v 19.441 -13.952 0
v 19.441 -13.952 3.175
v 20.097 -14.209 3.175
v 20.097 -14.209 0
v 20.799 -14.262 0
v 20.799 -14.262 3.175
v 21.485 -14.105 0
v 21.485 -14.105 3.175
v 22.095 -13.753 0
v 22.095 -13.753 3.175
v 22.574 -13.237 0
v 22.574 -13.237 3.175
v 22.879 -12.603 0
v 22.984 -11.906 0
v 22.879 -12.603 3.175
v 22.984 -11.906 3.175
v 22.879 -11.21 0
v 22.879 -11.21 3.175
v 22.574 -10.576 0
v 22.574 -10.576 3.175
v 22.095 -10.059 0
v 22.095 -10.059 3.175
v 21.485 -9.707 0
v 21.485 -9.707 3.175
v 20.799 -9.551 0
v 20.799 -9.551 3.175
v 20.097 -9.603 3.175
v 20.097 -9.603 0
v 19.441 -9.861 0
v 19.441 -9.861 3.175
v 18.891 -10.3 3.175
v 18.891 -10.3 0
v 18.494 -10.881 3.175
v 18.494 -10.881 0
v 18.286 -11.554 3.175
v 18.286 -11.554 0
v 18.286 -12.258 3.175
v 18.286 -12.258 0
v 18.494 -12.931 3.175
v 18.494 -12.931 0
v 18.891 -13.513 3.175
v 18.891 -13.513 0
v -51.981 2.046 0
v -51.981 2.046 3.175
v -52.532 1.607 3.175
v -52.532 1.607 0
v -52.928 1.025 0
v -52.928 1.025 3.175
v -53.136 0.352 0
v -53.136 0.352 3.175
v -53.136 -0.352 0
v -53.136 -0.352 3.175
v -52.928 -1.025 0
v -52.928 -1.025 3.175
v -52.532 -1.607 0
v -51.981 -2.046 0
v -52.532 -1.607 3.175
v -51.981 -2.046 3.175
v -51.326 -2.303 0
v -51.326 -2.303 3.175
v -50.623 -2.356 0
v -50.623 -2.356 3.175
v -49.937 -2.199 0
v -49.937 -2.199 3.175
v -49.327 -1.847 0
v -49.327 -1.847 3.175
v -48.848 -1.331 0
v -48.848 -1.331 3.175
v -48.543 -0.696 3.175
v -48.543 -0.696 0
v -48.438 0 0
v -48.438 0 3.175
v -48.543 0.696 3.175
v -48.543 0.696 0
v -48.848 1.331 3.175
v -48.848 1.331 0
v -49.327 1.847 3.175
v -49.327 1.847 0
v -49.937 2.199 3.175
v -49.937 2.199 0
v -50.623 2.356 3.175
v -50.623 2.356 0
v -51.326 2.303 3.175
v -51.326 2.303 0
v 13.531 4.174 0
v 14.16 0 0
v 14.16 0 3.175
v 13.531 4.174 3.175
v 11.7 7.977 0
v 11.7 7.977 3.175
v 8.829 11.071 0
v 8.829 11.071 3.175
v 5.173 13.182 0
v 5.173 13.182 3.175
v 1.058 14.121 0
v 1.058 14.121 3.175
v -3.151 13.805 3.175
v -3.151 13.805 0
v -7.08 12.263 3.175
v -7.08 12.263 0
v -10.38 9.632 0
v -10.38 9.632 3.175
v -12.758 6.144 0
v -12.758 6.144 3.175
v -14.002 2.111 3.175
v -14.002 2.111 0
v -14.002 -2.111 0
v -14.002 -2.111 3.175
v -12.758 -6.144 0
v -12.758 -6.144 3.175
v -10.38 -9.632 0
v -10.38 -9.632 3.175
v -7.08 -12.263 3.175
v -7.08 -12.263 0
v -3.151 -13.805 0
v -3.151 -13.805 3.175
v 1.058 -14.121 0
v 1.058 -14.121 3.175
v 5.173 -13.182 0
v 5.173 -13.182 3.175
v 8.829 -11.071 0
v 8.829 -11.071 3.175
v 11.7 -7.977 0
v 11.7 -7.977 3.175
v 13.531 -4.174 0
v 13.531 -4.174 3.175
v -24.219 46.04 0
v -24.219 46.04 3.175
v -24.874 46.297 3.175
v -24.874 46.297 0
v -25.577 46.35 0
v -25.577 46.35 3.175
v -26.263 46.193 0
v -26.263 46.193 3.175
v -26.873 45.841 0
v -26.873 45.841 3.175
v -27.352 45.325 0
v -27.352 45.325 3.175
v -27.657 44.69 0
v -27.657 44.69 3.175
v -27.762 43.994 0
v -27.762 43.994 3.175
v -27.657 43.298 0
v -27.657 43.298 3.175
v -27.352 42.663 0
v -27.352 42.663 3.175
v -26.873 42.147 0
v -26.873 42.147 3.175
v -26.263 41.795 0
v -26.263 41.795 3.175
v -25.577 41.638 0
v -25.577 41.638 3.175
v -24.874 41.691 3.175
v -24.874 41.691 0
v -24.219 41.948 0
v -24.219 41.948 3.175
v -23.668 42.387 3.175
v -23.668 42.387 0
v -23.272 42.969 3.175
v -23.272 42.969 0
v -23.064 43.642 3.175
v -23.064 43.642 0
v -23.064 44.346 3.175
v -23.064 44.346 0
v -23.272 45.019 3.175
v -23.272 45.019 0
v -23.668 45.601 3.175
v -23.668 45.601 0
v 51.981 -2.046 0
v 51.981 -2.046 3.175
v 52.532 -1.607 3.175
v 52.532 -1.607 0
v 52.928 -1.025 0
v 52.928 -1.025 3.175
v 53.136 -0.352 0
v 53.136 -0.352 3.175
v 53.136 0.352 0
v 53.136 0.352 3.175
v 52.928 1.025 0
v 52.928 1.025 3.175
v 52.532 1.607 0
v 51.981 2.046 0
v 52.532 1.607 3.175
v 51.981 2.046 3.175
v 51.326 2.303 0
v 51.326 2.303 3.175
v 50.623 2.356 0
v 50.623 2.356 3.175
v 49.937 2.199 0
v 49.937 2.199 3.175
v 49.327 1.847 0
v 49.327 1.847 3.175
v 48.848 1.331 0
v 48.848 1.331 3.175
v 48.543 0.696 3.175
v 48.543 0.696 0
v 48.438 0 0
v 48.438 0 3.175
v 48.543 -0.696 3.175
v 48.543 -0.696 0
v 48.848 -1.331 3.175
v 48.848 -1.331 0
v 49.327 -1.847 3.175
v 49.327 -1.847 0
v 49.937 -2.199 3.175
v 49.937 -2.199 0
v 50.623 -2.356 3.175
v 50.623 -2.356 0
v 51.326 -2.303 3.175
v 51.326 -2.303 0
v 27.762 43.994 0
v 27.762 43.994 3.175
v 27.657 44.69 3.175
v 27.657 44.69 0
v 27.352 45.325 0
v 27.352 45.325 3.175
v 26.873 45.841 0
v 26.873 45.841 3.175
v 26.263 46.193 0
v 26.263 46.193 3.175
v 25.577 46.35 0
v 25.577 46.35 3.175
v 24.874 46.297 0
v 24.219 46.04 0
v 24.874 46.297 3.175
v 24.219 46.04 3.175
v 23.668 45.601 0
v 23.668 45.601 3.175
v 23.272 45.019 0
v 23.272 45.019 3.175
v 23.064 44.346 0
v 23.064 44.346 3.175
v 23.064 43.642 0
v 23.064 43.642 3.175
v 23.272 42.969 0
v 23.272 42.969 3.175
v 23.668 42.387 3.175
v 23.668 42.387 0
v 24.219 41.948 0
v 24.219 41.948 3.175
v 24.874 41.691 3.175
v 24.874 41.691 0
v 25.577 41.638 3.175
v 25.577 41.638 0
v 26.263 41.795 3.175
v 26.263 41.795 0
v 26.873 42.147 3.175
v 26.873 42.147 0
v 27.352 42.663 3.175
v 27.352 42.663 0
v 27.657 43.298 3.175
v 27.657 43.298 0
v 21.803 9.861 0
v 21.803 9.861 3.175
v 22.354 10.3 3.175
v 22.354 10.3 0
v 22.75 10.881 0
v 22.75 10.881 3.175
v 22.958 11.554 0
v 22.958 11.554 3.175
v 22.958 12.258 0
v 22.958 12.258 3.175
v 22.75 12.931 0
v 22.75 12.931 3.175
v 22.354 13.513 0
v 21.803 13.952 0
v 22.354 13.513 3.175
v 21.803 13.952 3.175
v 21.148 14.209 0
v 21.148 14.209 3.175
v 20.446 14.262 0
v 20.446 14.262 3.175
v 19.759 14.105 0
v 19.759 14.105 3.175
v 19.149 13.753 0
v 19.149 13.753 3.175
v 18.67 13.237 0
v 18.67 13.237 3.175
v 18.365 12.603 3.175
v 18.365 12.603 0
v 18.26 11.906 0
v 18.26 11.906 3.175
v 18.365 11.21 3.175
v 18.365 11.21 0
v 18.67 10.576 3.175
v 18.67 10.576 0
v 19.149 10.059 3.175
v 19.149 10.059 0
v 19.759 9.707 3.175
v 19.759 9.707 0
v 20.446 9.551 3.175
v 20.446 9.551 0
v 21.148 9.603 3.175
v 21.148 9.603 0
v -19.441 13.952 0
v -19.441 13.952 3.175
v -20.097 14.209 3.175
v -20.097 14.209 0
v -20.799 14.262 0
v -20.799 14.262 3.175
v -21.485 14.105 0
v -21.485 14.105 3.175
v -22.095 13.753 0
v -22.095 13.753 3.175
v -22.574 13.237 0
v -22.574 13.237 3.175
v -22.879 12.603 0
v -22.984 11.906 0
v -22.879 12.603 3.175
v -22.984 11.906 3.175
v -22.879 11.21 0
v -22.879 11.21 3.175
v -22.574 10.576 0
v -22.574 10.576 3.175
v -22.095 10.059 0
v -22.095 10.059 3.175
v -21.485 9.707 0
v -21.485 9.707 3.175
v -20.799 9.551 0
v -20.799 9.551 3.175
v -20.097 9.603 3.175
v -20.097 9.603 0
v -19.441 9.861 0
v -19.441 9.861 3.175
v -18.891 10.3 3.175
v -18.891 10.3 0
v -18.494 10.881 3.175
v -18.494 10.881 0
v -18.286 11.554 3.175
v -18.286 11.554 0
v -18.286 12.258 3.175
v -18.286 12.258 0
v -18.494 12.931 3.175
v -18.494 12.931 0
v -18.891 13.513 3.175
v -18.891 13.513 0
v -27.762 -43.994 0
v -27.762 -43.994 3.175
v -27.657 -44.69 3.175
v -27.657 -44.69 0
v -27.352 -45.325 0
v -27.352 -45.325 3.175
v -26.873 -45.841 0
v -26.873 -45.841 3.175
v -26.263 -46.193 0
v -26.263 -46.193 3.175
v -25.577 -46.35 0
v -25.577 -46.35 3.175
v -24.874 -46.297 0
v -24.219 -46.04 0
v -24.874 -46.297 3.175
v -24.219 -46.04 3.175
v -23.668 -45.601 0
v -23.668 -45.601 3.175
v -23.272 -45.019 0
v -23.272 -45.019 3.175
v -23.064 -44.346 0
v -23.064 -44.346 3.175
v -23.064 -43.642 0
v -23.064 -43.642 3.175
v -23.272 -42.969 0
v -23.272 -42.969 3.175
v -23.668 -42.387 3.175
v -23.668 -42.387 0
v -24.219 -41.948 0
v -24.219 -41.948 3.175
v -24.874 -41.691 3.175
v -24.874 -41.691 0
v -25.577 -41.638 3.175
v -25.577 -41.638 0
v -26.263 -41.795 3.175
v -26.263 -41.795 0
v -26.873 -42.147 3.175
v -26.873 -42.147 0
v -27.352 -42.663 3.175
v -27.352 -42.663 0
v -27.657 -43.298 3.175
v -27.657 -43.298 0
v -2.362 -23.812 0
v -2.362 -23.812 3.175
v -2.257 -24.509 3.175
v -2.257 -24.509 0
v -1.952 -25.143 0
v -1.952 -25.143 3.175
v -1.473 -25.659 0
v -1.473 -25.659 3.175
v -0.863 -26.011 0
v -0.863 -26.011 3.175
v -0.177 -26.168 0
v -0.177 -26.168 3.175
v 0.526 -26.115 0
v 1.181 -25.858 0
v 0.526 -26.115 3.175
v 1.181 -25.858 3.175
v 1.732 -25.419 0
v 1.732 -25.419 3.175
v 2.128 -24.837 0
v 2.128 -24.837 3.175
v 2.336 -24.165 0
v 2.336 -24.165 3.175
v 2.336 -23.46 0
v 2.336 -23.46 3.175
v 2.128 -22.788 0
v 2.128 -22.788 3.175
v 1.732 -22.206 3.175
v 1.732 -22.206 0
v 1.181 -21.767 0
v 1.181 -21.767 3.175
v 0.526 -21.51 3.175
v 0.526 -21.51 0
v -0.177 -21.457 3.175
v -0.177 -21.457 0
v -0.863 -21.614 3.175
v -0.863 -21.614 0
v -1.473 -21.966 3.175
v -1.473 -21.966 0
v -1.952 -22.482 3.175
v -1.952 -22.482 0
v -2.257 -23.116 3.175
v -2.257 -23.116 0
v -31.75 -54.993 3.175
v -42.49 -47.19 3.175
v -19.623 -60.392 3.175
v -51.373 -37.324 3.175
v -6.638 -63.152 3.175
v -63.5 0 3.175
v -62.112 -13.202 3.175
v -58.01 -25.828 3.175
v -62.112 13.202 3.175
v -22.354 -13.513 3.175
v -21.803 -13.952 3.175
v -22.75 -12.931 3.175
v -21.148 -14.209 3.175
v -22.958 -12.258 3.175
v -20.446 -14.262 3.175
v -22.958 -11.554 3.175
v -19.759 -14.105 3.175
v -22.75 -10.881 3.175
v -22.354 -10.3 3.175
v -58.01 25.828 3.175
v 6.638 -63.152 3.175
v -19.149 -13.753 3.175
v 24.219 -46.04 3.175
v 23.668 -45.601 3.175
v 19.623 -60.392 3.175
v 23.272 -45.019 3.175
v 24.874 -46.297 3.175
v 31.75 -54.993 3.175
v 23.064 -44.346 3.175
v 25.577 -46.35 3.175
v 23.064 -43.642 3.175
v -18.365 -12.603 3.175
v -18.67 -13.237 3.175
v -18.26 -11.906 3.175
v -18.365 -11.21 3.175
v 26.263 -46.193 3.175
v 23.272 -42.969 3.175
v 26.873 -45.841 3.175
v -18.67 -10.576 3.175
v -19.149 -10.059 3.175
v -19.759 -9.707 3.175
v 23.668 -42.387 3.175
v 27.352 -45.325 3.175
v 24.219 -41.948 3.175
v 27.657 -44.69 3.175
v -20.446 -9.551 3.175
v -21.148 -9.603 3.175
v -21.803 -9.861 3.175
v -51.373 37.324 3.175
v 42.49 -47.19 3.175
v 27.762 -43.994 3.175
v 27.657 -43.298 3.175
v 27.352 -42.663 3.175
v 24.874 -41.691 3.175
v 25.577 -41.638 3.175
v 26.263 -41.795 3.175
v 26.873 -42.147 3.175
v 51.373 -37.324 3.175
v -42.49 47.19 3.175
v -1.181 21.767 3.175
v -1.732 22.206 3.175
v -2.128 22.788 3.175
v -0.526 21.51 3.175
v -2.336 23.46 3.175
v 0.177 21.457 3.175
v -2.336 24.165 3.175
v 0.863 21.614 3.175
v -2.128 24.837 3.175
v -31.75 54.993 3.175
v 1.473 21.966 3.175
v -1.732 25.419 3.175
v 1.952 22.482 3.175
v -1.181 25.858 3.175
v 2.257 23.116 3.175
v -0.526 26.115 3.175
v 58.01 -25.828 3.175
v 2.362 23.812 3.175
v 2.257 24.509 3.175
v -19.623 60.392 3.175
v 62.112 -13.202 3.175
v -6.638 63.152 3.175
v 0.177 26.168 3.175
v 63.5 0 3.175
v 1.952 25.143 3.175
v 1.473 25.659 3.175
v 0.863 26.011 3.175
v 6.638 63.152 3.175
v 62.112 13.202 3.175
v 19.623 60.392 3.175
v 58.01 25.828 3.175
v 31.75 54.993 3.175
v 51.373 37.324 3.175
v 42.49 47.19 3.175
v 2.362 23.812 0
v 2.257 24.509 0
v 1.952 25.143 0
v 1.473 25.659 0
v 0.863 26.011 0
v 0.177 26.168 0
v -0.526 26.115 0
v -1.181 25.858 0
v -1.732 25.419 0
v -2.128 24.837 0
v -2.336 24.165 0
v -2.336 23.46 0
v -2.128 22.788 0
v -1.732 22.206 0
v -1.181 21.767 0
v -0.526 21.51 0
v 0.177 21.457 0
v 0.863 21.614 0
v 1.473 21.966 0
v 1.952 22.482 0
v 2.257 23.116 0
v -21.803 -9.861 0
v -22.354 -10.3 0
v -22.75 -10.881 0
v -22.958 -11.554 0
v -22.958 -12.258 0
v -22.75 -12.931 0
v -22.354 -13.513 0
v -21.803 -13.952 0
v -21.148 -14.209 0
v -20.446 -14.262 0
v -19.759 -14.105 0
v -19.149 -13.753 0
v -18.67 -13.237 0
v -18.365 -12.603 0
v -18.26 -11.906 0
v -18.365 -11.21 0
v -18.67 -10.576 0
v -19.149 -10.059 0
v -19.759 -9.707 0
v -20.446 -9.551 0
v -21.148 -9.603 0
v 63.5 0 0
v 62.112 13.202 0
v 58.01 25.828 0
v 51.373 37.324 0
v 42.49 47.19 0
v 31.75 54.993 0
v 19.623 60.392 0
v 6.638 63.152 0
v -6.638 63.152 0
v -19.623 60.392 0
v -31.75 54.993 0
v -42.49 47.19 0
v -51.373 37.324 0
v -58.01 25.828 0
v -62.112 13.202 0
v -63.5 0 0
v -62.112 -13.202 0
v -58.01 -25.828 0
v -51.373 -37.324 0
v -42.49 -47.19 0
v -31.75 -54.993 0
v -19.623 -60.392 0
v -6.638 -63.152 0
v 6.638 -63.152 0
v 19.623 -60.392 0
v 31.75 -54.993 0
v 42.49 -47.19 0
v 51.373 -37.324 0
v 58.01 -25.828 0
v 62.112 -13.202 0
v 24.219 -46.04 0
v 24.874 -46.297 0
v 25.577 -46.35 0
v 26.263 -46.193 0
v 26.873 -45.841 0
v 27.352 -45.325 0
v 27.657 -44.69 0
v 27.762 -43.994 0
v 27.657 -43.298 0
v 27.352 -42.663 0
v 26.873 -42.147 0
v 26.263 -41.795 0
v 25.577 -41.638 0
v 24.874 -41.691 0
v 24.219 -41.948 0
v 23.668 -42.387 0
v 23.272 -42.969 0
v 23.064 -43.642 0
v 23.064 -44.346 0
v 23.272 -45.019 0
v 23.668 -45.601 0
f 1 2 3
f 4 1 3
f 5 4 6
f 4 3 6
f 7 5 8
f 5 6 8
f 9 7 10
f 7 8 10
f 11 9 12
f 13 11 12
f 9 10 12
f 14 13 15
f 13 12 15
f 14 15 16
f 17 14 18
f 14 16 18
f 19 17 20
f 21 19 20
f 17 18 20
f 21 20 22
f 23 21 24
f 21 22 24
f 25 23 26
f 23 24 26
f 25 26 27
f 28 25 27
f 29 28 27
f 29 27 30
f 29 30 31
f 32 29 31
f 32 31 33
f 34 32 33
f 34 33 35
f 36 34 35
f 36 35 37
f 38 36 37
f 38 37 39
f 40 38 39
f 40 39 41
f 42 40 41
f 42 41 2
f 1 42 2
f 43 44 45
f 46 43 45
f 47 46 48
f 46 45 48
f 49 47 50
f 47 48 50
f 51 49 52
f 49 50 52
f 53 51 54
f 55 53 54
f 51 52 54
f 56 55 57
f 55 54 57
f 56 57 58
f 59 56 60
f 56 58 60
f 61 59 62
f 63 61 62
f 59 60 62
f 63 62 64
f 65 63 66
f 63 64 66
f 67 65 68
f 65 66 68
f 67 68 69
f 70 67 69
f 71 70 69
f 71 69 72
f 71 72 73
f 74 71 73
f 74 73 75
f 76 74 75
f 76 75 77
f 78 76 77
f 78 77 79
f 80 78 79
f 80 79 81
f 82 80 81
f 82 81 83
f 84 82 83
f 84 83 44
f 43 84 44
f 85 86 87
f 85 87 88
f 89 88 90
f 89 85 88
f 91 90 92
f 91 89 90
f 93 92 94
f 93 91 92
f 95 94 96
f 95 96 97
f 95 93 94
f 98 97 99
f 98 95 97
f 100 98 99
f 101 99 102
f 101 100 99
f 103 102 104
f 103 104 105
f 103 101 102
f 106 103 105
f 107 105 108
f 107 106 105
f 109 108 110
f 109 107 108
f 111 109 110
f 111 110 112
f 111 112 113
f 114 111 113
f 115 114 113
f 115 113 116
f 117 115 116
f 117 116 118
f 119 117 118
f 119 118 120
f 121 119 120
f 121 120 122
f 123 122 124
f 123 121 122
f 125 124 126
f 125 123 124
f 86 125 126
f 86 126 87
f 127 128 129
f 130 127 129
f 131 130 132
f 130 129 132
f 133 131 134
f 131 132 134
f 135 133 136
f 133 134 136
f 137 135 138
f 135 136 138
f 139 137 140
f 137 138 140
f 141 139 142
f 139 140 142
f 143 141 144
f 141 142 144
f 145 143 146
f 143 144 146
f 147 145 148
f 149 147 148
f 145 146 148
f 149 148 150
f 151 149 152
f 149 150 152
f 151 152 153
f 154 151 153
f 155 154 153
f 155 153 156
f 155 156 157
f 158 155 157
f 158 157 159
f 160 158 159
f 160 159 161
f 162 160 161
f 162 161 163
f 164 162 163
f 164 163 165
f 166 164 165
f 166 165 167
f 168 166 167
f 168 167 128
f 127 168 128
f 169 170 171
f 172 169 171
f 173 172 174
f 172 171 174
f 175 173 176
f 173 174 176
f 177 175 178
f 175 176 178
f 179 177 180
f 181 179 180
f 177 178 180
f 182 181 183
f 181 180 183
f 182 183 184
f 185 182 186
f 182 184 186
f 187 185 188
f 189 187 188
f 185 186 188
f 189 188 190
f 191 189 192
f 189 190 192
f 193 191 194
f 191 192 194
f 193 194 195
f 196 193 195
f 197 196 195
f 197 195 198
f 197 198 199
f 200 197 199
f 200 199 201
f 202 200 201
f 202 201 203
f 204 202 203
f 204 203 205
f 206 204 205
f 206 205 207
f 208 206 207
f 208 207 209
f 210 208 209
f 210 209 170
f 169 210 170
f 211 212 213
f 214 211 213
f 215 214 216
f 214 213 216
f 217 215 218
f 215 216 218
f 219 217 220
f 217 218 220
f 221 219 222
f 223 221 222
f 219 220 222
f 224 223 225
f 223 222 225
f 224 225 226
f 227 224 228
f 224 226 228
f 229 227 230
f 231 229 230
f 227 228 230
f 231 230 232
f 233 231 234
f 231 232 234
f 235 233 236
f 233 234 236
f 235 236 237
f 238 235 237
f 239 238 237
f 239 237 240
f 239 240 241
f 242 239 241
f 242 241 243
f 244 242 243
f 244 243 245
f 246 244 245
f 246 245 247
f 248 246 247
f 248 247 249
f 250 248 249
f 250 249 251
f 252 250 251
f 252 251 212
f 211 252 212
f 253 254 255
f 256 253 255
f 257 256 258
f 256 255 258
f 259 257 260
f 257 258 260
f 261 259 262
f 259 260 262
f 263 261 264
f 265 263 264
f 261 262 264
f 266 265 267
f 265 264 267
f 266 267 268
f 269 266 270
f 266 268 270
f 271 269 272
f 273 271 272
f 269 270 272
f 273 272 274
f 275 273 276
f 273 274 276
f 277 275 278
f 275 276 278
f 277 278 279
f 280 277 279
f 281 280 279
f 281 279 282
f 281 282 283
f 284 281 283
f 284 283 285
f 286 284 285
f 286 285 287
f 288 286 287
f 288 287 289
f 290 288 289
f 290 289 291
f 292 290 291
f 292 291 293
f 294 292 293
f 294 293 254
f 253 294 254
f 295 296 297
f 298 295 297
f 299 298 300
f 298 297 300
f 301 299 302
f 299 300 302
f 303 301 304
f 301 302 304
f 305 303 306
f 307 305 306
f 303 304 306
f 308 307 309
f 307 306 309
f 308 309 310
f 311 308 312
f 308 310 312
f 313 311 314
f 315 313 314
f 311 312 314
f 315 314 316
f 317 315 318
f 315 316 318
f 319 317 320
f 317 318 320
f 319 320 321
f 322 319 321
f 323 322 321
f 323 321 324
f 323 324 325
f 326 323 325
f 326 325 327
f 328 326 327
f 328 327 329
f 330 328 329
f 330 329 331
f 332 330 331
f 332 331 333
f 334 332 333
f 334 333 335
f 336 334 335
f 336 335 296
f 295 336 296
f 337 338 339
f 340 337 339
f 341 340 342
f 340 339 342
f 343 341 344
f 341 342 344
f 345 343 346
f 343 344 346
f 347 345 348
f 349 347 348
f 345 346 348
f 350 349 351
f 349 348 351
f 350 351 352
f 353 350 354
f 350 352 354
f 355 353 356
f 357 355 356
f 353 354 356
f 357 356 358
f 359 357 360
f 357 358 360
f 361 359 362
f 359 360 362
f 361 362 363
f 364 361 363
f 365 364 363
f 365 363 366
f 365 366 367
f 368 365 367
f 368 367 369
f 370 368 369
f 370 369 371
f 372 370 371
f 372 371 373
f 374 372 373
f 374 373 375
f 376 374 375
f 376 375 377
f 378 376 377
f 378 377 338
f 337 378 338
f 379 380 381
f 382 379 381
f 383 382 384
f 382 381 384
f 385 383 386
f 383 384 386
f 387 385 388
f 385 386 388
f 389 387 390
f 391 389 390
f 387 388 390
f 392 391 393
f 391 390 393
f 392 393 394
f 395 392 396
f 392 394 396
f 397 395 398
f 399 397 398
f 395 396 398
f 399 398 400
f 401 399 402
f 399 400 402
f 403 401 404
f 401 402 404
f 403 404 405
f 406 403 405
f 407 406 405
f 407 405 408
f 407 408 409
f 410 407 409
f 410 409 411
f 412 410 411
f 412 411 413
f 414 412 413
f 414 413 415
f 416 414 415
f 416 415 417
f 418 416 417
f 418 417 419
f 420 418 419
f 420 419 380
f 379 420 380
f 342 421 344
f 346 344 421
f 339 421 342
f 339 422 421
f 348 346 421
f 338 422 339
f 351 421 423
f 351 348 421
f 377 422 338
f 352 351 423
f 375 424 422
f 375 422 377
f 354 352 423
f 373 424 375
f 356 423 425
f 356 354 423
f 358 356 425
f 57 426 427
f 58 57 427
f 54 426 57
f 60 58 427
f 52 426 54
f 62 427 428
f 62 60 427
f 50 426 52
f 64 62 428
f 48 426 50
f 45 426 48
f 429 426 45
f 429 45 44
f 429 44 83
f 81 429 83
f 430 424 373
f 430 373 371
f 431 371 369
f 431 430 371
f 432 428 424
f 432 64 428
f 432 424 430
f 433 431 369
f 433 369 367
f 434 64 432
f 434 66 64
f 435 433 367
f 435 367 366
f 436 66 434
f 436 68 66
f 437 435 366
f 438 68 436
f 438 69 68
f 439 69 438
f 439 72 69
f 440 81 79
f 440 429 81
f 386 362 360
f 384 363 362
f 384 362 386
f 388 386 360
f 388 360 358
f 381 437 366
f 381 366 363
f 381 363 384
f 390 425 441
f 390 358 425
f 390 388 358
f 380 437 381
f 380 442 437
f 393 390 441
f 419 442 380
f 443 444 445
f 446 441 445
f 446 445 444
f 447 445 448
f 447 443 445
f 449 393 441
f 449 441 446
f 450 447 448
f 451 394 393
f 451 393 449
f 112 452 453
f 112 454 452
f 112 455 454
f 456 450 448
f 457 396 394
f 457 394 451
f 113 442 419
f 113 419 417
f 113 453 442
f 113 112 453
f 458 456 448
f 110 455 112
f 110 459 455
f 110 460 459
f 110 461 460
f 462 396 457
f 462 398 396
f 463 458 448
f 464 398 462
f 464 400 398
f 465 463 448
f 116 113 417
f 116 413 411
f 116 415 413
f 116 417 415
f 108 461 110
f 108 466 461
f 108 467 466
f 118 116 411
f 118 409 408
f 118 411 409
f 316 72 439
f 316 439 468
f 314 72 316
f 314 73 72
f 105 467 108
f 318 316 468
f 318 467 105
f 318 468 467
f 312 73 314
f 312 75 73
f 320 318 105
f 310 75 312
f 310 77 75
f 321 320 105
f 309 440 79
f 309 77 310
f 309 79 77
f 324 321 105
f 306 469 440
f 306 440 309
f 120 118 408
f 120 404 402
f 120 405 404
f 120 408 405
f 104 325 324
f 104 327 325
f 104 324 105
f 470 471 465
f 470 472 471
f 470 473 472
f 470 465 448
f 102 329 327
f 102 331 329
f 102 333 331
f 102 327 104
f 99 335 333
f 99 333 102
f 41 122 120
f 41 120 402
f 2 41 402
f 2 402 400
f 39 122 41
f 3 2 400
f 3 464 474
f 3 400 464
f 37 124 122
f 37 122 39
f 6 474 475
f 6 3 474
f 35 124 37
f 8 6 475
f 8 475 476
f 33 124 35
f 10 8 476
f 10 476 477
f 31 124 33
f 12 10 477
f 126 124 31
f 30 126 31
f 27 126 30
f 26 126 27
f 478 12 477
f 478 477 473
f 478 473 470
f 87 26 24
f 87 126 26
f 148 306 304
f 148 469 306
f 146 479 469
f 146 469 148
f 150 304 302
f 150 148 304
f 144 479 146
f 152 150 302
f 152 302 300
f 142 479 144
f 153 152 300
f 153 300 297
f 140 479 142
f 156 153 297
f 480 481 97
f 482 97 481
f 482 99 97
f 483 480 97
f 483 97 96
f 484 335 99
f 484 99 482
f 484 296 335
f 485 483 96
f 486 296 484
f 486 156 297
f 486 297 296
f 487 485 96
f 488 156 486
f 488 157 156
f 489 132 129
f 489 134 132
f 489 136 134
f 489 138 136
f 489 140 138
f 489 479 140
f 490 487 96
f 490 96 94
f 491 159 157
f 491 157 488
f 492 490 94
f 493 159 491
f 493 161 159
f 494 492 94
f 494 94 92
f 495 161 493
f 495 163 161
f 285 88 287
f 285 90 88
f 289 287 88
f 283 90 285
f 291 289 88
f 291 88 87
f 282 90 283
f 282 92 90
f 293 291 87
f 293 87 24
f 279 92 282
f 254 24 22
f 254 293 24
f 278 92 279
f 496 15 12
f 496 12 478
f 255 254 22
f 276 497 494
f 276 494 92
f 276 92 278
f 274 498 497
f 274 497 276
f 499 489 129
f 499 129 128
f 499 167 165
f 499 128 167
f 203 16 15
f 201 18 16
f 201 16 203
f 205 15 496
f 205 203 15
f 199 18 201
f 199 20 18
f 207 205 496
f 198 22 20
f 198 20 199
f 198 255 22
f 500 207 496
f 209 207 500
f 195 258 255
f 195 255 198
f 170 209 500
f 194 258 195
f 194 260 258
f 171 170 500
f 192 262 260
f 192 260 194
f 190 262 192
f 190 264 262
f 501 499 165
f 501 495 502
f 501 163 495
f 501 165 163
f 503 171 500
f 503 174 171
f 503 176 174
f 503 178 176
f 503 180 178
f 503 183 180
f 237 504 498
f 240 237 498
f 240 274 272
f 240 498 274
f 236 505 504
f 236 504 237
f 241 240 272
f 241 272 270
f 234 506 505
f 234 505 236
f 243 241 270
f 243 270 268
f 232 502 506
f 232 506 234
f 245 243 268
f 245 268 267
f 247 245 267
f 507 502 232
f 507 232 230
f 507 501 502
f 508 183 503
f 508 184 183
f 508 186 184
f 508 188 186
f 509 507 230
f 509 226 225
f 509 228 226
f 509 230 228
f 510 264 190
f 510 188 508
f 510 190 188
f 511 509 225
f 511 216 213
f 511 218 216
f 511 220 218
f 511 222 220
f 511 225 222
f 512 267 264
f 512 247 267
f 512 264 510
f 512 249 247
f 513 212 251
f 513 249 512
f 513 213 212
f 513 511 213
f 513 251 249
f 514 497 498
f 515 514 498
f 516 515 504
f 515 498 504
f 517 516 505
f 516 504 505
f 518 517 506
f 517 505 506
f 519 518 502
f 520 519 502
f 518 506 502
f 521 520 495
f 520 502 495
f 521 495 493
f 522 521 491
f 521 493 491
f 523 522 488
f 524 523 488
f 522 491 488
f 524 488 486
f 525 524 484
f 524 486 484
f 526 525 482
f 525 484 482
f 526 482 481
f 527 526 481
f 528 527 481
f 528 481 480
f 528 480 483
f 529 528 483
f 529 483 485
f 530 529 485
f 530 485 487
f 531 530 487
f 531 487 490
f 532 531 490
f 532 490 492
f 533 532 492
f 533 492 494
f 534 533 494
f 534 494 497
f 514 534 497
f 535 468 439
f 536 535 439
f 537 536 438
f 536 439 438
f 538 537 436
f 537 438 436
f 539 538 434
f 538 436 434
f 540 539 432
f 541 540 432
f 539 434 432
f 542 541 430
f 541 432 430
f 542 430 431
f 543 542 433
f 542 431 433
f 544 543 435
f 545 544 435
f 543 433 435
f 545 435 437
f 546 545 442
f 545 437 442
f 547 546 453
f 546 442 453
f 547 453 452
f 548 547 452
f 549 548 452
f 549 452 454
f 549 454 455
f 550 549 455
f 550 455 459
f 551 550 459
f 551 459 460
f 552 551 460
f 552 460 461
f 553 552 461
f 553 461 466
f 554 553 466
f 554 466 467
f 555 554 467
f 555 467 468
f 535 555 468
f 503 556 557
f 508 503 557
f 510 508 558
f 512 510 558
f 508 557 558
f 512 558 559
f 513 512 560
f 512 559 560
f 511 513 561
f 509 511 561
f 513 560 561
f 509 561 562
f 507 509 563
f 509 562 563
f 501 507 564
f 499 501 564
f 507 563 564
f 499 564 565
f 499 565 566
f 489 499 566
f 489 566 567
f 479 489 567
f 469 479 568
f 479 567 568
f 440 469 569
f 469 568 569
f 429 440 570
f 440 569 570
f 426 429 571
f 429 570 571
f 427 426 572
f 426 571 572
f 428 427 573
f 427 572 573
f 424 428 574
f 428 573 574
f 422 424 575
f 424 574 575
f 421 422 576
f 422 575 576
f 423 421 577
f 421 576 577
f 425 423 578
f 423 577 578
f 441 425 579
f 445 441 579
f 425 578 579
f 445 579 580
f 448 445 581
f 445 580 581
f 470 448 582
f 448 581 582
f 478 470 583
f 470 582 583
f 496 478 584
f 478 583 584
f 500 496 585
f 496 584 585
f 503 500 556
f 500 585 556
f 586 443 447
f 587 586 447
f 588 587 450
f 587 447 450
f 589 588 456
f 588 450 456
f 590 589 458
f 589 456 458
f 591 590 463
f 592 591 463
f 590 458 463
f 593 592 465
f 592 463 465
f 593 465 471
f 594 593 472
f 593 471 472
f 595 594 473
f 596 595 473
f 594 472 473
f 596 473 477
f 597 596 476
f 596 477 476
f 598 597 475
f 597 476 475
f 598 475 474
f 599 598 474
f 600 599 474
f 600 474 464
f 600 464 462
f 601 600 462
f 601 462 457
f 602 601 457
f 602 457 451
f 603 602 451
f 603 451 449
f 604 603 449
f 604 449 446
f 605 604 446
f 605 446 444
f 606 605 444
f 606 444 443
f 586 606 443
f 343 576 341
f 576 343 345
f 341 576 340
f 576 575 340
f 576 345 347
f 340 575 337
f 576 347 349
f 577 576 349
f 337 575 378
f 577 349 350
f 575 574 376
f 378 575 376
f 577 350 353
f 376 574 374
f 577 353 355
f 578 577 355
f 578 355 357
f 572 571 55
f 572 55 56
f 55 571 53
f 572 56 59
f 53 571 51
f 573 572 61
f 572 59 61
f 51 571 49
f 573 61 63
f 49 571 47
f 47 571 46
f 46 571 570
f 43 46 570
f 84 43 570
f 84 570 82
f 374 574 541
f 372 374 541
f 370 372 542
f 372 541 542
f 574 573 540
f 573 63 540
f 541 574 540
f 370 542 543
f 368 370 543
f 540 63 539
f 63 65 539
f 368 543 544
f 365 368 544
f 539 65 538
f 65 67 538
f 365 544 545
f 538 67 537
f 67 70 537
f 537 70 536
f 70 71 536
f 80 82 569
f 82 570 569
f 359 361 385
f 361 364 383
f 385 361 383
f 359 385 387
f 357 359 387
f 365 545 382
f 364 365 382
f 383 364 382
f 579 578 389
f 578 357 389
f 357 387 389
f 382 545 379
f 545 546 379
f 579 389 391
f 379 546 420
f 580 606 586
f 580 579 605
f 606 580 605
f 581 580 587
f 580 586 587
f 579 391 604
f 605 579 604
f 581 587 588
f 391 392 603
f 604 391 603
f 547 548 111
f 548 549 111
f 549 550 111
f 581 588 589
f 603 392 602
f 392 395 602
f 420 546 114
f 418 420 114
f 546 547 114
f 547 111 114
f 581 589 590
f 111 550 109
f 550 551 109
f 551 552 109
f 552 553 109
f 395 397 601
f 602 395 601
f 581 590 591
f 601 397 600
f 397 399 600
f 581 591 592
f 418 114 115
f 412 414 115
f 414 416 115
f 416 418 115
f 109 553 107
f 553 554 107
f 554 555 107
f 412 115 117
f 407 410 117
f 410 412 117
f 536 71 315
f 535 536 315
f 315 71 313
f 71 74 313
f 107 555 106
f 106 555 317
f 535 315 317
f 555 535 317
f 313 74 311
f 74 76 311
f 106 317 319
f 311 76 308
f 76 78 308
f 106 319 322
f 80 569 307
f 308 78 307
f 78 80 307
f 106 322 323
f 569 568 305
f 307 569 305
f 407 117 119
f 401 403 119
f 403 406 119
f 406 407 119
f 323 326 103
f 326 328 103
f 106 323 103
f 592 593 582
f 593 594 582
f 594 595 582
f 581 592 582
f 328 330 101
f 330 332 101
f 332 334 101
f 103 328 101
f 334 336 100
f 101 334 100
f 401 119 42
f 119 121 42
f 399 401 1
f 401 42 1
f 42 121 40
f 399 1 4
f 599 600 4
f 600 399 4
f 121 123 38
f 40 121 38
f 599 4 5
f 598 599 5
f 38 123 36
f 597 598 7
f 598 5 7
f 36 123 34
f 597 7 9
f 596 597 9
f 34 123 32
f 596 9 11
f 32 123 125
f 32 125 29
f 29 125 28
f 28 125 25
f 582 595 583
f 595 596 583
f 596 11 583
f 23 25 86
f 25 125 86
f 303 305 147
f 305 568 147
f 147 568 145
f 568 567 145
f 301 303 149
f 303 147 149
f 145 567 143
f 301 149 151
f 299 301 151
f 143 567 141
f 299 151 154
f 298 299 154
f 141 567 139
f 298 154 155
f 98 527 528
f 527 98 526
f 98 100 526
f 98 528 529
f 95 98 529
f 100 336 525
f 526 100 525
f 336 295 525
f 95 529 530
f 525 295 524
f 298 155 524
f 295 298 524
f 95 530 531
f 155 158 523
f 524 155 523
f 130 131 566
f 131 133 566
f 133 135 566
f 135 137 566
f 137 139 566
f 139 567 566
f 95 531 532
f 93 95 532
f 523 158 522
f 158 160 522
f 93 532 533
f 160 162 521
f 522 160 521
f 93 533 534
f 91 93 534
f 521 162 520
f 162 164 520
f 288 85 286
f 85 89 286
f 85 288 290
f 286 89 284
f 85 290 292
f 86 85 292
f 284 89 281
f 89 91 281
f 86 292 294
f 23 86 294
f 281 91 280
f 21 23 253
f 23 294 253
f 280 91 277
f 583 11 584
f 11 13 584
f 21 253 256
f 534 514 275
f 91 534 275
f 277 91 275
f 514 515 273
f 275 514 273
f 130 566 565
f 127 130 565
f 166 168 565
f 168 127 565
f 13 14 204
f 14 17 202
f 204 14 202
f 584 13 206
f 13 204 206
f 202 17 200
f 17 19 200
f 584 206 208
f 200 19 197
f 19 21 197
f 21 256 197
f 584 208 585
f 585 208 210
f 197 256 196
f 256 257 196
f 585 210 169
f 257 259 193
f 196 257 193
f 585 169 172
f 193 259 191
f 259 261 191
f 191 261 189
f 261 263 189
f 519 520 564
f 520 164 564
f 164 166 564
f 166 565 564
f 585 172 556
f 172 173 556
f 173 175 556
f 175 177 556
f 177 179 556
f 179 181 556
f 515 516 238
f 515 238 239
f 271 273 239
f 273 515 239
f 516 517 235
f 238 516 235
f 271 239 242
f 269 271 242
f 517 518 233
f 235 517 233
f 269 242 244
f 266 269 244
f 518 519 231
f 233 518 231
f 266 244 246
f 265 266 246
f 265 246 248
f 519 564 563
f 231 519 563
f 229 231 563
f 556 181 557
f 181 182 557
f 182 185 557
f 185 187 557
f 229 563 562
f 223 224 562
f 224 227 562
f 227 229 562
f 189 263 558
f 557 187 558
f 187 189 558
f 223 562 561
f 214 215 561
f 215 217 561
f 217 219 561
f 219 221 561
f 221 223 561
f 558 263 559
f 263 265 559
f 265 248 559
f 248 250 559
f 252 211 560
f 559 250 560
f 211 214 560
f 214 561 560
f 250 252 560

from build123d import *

# Parameters (mm, degrees)
F0_R            = 63.5
F0_R_2          = 14.1605
F1_DEPTH        = 3.175
F2_R            = 2.3622
F3_DEPTH        = 3.176
F3_COPIES_COUNT = 6


# Not quite as in the source:
# - a pattern or mirror of a feature is missing from the dataset's text; its kind, count and spacing are read off the source's solid


with BuildPart() as f1:
    # F0 (on Top) → F1 (new body)
    with BuildSketch(Plane.XY):
        Circle(F0_R)
        Circle(F0_R_2, mode=Mode.SUBTRACT)
    extrude(amount=F1_DEPTH)

    # F2 (on face) → F3 (cut, through all)
    with BuildSketch(Plane.XY.offset(3.175)):
        with Locations((0, 23.8125)):
            Circle(F2_R)
        with Locations((25.4, 43.9940905122)):
            Circle(F2_R)
    f3 = extrude(amount=-F3_DEPTH, mode=Mode.SUBTRACT)

    # F3_copies: F3 ×6 about axis
    f3_copies_axis = Axis((0, 0, 0), (0, 0, 1))
    for i in range(1, F3_COPIES_COUNT):
        add(f3.rotate(f3_copies_axis, i * 360 / F3_COPIES_COUNT), mode=Mode.SUBTRACT)


solid = f1.part
